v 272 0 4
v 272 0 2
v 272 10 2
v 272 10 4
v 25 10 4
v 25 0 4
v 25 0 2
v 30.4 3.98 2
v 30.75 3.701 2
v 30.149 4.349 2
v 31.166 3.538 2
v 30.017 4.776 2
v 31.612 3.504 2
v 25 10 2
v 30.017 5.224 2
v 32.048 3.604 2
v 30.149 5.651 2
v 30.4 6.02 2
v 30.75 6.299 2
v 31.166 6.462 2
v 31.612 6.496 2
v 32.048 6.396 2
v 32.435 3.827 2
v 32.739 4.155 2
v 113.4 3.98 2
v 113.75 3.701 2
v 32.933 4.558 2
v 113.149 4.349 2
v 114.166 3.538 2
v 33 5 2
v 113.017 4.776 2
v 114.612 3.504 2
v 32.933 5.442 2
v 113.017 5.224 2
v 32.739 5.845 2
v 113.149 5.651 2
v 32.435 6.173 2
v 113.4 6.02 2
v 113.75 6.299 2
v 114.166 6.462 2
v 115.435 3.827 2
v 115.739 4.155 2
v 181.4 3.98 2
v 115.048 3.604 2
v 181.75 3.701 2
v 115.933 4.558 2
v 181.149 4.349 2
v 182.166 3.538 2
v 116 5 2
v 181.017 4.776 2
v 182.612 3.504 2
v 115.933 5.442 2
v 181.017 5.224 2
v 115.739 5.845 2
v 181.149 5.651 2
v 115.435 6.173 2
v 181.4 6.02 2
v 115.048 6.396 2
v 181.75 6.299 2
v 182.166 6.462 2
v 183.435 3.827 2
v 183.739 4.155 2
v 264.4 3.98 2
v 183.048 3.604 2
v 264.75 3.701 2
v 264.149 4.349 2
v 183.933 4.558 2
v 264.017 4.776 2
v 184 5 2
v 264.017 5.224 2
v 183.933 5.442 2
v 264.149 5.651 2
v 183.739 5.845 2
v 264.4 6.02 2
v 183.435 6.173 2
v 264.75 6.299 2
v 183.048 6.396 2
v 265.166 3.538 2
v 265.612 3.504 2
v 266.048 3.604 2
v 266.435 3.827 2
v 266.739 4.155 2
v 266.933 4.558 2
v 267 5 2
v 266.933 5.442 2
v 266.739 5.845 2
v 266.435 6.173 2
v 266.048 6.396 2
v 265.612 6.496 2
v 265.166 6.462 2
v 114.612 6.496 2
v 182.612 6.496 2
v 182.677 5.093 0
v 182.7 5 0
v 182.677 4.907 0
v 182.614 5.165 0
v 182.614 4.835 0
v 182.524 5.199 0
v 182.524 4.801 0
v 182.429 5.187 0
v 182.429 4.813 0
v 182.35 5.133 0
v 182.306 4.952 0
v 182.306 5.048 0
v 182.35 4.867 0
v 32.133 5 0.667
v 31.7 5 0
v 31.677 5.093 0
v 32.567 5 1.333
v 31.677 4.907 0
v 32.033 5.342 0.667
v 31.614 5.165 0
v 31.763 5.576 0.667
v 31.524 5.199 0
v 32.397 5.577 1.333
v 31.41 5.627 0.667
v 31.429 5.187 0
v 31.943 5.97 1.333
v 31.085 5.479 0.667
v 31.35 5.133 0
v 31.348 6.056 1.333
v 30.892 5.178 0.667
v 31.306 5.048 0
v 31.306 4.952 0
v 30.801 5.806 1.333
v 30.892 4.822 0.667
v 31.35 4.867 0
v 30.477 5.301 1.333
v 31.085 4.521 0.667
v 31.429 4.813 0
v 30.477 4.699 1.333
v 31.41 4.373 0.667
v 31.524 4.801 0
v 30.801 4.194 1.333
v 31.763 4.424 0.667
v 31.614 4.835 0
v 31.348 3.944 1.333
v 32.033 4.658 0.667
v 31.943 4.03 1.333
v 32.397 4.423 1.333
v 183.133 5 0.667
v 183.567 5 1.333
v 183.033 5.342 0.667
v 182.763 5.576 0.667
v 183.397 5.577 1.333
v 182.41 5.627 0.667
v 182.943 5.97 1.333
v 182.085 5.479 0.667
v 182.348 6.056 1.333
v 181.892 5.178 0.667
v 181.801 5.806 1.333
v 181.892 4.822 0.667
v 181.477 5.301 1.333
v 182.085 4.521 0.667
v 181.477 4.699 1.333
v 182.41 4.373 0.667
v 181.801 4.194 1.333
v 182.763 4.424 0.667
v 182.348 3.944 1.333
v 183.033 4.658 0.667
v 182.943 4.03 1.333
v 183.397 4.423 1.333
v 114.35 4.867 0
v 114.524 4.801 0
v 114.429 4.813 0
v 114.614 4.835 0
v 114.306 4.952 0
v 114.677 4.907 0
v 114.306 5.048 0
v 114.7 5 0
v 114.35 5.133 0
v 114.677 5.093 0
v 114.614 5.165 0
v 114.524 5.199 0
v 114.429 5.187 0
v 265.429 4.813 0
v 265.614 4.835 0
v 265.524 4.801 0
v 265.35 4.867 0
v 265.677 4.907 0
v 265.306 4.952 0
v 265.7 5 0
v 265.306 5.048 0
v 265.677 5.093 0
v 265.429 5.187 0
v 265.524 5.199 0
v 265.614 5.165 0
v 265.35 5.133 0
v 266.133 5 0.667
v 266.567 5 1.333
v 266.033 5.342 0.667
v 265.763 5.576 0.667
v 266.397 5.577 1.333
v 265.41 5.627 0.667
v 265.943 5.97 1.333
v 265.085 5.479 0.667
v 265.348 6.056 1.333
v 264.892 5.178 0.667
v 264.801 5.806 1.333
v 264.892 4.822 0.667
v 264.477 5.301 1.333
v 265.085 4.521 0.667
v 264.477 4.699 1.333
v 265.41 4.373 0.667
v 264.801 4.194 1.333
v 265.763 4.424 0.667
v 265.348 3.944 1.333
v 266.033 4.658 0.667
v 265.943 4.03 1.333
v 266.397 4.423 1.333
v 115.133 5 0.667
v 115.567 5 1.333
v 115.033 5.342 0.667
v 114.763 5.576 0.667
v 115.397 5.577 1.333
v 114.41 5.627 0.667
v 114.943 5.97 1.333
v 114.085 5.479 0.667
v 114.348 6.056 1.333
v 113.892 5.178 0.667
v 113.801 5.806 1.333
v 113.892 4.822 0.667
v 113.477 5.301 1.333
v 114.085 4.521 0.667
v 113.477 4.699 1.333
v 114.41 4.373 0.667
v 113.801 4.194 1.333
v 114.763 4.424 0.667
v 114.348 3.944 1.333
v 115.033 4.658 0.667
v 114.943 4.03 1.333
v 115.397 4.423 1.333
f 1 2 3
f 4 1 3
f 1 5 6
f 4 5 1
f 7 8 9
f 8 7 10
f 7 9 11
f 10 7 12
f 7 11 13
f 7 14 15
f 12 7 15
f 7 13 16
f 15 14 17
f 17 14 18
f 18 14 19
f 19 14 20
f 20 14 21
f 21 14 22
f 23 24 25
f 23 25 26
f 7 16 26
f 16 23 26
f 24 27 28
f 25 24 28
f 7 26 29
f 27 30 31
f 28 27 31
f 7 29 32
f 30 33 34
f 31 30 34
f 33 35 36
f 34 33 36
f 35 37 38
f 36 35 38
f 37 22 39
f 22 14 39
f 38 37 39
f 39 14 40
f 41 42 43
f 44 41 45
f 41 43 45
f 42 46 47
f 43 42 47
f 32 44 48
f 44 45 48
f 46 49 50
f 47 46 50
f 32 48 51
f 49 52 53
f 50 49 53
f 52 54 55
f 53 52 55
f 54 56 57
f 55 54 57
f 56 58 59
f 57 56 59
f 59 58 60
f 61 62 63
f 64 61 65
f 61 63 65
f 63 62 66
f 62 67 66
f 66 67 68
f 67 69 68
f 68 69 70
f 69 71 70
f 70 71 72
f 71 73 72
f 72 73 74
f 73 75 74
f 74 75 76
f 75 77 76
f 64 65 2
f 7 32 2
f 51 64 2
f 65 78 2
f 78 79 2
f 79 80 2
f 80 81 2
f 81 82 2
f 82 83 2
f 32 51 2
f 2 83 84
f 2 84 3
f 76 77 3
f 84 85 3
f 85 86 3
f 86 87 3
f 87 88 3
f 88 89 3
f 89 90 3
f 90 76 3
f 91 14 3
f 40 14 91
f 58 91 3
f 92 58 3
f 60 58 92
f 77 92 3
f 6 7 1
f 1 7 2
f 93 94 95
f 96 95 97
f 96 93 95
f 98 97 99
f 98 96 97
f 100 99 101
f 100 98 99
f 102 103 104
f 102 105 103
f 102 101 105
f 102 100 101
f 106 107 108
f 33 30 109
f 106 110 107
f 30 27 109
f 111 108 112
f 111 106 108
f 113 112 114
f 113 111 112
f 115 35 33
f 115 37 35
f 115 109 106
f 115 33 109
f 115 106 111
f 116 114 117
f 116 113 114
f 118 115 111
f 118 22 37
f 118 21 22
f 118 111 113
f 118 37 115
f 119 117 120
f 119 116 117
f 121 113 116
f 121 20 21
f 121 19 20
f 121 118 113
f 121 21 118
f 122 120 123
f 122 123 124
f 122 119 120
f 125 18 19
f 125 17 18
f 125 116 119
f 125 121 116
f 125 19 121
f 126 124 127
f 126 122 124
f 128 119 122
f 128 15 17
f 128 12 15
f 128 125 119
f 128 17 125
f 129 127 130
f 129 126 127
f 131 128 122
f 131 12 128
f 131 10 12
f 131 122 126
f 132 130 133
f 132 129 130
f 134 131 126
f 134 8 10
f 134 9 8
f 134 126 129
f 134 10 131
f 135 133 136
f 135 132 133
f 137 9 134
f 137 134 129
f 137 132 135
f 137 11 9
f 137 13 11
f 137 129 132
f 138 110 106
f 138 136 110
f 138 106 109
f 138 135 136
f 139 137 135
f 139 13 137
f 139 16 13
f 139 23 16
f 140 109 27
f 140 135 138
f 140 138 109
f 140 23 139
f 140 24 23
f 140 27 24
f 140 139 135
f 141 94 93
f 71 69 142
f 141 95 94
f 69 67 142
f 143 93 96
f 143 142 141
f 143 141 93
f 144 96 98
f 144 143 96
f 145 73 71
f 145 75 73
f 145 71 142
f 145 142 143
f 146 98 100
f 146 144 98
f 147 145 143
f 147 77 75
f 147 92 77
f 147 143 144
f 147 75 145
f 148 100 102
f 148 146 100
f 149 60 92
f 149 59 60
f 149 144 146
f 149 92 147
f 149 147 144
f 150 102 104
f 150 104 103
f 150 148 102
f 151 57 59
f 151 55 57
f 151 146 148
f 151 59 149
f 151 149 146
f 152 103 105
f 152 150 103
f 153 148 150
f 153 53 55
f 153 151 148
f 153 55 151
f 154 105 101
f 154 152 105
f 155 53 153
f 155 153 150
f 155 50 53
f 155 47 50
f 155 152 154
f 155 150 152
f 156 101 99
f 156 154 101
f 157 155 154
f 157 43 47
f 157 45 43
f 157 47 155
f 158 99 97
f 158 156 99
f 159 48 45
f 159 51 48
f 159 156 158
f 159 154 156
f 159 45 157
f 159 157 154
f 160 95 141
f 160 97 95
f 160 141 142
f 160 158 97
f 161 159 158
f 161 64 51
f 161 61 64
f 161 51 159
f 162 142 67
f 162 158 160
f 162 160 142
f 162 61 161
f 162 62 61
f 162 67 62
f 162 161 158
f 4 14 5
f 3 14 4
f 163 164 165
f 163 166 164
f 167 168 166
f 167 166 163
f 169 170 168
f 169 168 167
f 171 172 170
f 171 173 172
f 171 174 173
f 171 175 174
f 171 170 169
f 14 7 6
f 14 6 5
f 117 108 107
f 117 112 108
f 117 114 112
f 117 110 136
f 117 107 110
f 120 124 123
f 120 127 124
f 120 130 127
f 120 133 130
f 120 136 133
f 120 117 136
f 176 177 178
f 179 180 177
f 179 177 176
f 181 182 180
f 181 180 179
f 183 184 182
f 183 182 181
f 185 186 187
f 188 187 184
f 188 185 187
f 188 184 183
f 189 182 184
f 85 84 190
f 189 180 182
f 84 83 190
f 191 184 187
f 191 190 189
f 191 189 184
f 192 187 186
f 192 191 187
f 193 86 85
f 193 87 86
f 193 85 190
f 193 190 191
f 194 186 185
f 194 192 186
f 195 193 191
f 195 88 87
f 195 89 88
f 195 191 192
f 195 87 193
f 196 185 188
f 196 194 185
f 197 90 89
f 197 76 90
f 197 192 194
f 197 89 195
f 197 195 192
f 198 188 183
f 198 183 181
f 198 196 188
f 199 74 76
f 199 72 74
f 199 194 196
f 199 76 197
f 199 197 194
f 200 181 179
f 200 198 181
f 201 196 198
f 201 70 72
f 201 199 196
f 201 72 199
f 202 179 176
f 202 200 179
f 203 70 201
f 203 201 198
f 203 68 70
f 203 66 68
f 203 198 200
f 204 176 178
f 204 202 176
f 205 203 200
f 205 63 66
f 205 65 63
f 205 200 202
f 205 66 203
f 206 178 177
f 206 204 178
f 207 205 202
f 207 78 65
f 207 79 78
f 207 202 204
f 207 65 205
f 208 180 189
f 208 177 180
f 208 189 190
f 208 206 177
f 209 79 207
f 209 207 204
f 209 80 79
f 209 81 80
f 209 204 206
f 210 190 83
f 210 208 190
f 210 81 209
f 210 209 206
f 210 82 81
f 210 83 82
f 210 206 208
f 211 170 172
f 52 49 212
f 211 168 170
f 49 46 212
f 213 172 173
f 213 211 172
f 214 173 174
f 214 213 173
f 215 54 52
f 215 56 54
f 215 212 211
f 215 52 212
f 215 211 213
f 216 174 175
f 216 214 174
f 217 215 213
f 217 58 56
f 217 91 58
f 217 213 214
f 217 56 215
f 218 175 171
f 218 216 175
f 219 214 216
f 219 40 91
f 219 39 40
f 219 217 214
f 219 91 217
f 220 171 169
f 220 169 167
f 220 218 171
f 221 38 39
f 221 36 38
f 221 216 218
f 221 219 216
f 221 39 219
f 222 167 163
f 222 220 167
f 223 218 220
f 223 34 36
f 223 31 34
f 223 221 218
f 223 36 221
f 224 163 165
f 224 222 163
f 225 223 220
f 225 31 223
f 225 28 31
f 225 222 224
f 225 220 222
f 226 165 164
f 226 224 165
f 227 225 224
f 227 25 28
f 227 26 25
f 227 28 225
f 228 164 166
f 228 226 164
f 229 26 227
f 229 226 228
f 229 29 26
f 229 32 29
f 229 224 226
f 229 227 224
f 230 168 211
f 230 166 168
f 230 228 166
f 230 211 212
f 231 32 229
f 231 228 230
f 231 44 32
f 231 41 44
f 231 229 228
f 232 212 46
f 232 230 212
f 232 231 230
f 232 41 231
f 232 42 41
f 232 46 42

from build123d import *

# Parameters (mm, degrees)
BOX005_W     = 25
BOX005_H     = 10
BOX005_DEPTH = 10
BOX004_W     = 25
BOX004_H     = 10
BOX004_DEPTH = 10
BOX001_W     = 297
BOX001_H     = 10
BOX001_DEPTH = 2


with BuildPart() as cube005:
    # Box005 → Box005 (new body)
    with BuildSketch(Plane(origin=(272, 0, 0), x_dir=(1, 0, 0), z_dir=(0, 0, 1))):
        with Locations((12.5, 5)):
            Rectangle(BOX005_W, BOX005_H)
    extrude(amount=BOX005_DEPTH)


with BuildPart() as cube004:
    # Box004 → Box004 (new body)
    with BuildSketch(Plane.XY):
        with Locations((12.5, 5)):
            Rectangle(BOX004_W, BOX004_H)
    extrude(amount=BOX004_DEPTH)


with BuildPart() as cone004:
    # Cone004 → Cone004 (revolve)
    with BuildSketch(Plane(origin=(31.5, 5, 0), x_dir=(1, 0, 0), z_dir=(0, -1, 0))):
        Polygon((0, 0), (0.2, 0), (1.5, 2), (0, 2), align=None)
    revolve(axis=Axis((31.5, 5, 0), (0, 0, 1)))


with BuildPart() as cone005:
    # Cone005 → Cone005 (revolve)
    with BuildSketch(Plane(origin=(114.5, 5, 0), x_dir=(1, 0, 0), z_dir=(0, -1, 0))):
        Polygon((0, 0), (0.2, 0), (1.5, 2), (0, 2), align=None)
    revolve(axis=Axis((114.5, 5, 0), (0, 0, 1)))


with BuildPart() as cone006:
    # Cone006 → Cone006 (revolve)
    with BuildSketch(Plane(origin=(182.5, 5, 0), x_dir=(1, 0, 0), z_dir=(0, -1, 0))):
        Polygon((0, 0), (0.2, 0), (1.5, 2), (0, 2), align=None)
    revolve(axis=Axis((182.5, 5, 0), (0, 0, 1)))


with BuildPart() as cone007:
    # Cone007 → Cone007 (revolve)
    with BuildSketch(Plane(origin=(265.5, 5, 0), x_dir=(1, 0, 0), z_dir=(0, -1, 0))):
        Polygon((0, 0), (0.2, 0), (1.5, 2), (0, 2), align=None)
    revolve(axis=Axis((265.5, 5, 0), (0, 0, 1)))


with BuildPart() as cortador:
    # Box001 → Box001 (new body)
    with BuildSketch(Plane.XY.offset(2)):
        with Locations((148.5, 5)):
            Rectangle(BOX001_W, BOX001_H)
    extrude(amount=BOX001_DEPTH)

    # Fusion: union Cone007
    add(cone007.part)

    # Fusion001: union Cone006
    add(cone006.part)

    # Fusion002: union Cone005
    add(cone005.part)

    # Fusion003: union Cone004
    add(cone004.part)

    # Cut005: cut Cube004
    add(cube004.part, mode=Mode.SUBTRACT)

    # Cut006: cut Cube005
    add(cube005.part, mode=Mode.SUBTRACT)


solid = cortador.part
